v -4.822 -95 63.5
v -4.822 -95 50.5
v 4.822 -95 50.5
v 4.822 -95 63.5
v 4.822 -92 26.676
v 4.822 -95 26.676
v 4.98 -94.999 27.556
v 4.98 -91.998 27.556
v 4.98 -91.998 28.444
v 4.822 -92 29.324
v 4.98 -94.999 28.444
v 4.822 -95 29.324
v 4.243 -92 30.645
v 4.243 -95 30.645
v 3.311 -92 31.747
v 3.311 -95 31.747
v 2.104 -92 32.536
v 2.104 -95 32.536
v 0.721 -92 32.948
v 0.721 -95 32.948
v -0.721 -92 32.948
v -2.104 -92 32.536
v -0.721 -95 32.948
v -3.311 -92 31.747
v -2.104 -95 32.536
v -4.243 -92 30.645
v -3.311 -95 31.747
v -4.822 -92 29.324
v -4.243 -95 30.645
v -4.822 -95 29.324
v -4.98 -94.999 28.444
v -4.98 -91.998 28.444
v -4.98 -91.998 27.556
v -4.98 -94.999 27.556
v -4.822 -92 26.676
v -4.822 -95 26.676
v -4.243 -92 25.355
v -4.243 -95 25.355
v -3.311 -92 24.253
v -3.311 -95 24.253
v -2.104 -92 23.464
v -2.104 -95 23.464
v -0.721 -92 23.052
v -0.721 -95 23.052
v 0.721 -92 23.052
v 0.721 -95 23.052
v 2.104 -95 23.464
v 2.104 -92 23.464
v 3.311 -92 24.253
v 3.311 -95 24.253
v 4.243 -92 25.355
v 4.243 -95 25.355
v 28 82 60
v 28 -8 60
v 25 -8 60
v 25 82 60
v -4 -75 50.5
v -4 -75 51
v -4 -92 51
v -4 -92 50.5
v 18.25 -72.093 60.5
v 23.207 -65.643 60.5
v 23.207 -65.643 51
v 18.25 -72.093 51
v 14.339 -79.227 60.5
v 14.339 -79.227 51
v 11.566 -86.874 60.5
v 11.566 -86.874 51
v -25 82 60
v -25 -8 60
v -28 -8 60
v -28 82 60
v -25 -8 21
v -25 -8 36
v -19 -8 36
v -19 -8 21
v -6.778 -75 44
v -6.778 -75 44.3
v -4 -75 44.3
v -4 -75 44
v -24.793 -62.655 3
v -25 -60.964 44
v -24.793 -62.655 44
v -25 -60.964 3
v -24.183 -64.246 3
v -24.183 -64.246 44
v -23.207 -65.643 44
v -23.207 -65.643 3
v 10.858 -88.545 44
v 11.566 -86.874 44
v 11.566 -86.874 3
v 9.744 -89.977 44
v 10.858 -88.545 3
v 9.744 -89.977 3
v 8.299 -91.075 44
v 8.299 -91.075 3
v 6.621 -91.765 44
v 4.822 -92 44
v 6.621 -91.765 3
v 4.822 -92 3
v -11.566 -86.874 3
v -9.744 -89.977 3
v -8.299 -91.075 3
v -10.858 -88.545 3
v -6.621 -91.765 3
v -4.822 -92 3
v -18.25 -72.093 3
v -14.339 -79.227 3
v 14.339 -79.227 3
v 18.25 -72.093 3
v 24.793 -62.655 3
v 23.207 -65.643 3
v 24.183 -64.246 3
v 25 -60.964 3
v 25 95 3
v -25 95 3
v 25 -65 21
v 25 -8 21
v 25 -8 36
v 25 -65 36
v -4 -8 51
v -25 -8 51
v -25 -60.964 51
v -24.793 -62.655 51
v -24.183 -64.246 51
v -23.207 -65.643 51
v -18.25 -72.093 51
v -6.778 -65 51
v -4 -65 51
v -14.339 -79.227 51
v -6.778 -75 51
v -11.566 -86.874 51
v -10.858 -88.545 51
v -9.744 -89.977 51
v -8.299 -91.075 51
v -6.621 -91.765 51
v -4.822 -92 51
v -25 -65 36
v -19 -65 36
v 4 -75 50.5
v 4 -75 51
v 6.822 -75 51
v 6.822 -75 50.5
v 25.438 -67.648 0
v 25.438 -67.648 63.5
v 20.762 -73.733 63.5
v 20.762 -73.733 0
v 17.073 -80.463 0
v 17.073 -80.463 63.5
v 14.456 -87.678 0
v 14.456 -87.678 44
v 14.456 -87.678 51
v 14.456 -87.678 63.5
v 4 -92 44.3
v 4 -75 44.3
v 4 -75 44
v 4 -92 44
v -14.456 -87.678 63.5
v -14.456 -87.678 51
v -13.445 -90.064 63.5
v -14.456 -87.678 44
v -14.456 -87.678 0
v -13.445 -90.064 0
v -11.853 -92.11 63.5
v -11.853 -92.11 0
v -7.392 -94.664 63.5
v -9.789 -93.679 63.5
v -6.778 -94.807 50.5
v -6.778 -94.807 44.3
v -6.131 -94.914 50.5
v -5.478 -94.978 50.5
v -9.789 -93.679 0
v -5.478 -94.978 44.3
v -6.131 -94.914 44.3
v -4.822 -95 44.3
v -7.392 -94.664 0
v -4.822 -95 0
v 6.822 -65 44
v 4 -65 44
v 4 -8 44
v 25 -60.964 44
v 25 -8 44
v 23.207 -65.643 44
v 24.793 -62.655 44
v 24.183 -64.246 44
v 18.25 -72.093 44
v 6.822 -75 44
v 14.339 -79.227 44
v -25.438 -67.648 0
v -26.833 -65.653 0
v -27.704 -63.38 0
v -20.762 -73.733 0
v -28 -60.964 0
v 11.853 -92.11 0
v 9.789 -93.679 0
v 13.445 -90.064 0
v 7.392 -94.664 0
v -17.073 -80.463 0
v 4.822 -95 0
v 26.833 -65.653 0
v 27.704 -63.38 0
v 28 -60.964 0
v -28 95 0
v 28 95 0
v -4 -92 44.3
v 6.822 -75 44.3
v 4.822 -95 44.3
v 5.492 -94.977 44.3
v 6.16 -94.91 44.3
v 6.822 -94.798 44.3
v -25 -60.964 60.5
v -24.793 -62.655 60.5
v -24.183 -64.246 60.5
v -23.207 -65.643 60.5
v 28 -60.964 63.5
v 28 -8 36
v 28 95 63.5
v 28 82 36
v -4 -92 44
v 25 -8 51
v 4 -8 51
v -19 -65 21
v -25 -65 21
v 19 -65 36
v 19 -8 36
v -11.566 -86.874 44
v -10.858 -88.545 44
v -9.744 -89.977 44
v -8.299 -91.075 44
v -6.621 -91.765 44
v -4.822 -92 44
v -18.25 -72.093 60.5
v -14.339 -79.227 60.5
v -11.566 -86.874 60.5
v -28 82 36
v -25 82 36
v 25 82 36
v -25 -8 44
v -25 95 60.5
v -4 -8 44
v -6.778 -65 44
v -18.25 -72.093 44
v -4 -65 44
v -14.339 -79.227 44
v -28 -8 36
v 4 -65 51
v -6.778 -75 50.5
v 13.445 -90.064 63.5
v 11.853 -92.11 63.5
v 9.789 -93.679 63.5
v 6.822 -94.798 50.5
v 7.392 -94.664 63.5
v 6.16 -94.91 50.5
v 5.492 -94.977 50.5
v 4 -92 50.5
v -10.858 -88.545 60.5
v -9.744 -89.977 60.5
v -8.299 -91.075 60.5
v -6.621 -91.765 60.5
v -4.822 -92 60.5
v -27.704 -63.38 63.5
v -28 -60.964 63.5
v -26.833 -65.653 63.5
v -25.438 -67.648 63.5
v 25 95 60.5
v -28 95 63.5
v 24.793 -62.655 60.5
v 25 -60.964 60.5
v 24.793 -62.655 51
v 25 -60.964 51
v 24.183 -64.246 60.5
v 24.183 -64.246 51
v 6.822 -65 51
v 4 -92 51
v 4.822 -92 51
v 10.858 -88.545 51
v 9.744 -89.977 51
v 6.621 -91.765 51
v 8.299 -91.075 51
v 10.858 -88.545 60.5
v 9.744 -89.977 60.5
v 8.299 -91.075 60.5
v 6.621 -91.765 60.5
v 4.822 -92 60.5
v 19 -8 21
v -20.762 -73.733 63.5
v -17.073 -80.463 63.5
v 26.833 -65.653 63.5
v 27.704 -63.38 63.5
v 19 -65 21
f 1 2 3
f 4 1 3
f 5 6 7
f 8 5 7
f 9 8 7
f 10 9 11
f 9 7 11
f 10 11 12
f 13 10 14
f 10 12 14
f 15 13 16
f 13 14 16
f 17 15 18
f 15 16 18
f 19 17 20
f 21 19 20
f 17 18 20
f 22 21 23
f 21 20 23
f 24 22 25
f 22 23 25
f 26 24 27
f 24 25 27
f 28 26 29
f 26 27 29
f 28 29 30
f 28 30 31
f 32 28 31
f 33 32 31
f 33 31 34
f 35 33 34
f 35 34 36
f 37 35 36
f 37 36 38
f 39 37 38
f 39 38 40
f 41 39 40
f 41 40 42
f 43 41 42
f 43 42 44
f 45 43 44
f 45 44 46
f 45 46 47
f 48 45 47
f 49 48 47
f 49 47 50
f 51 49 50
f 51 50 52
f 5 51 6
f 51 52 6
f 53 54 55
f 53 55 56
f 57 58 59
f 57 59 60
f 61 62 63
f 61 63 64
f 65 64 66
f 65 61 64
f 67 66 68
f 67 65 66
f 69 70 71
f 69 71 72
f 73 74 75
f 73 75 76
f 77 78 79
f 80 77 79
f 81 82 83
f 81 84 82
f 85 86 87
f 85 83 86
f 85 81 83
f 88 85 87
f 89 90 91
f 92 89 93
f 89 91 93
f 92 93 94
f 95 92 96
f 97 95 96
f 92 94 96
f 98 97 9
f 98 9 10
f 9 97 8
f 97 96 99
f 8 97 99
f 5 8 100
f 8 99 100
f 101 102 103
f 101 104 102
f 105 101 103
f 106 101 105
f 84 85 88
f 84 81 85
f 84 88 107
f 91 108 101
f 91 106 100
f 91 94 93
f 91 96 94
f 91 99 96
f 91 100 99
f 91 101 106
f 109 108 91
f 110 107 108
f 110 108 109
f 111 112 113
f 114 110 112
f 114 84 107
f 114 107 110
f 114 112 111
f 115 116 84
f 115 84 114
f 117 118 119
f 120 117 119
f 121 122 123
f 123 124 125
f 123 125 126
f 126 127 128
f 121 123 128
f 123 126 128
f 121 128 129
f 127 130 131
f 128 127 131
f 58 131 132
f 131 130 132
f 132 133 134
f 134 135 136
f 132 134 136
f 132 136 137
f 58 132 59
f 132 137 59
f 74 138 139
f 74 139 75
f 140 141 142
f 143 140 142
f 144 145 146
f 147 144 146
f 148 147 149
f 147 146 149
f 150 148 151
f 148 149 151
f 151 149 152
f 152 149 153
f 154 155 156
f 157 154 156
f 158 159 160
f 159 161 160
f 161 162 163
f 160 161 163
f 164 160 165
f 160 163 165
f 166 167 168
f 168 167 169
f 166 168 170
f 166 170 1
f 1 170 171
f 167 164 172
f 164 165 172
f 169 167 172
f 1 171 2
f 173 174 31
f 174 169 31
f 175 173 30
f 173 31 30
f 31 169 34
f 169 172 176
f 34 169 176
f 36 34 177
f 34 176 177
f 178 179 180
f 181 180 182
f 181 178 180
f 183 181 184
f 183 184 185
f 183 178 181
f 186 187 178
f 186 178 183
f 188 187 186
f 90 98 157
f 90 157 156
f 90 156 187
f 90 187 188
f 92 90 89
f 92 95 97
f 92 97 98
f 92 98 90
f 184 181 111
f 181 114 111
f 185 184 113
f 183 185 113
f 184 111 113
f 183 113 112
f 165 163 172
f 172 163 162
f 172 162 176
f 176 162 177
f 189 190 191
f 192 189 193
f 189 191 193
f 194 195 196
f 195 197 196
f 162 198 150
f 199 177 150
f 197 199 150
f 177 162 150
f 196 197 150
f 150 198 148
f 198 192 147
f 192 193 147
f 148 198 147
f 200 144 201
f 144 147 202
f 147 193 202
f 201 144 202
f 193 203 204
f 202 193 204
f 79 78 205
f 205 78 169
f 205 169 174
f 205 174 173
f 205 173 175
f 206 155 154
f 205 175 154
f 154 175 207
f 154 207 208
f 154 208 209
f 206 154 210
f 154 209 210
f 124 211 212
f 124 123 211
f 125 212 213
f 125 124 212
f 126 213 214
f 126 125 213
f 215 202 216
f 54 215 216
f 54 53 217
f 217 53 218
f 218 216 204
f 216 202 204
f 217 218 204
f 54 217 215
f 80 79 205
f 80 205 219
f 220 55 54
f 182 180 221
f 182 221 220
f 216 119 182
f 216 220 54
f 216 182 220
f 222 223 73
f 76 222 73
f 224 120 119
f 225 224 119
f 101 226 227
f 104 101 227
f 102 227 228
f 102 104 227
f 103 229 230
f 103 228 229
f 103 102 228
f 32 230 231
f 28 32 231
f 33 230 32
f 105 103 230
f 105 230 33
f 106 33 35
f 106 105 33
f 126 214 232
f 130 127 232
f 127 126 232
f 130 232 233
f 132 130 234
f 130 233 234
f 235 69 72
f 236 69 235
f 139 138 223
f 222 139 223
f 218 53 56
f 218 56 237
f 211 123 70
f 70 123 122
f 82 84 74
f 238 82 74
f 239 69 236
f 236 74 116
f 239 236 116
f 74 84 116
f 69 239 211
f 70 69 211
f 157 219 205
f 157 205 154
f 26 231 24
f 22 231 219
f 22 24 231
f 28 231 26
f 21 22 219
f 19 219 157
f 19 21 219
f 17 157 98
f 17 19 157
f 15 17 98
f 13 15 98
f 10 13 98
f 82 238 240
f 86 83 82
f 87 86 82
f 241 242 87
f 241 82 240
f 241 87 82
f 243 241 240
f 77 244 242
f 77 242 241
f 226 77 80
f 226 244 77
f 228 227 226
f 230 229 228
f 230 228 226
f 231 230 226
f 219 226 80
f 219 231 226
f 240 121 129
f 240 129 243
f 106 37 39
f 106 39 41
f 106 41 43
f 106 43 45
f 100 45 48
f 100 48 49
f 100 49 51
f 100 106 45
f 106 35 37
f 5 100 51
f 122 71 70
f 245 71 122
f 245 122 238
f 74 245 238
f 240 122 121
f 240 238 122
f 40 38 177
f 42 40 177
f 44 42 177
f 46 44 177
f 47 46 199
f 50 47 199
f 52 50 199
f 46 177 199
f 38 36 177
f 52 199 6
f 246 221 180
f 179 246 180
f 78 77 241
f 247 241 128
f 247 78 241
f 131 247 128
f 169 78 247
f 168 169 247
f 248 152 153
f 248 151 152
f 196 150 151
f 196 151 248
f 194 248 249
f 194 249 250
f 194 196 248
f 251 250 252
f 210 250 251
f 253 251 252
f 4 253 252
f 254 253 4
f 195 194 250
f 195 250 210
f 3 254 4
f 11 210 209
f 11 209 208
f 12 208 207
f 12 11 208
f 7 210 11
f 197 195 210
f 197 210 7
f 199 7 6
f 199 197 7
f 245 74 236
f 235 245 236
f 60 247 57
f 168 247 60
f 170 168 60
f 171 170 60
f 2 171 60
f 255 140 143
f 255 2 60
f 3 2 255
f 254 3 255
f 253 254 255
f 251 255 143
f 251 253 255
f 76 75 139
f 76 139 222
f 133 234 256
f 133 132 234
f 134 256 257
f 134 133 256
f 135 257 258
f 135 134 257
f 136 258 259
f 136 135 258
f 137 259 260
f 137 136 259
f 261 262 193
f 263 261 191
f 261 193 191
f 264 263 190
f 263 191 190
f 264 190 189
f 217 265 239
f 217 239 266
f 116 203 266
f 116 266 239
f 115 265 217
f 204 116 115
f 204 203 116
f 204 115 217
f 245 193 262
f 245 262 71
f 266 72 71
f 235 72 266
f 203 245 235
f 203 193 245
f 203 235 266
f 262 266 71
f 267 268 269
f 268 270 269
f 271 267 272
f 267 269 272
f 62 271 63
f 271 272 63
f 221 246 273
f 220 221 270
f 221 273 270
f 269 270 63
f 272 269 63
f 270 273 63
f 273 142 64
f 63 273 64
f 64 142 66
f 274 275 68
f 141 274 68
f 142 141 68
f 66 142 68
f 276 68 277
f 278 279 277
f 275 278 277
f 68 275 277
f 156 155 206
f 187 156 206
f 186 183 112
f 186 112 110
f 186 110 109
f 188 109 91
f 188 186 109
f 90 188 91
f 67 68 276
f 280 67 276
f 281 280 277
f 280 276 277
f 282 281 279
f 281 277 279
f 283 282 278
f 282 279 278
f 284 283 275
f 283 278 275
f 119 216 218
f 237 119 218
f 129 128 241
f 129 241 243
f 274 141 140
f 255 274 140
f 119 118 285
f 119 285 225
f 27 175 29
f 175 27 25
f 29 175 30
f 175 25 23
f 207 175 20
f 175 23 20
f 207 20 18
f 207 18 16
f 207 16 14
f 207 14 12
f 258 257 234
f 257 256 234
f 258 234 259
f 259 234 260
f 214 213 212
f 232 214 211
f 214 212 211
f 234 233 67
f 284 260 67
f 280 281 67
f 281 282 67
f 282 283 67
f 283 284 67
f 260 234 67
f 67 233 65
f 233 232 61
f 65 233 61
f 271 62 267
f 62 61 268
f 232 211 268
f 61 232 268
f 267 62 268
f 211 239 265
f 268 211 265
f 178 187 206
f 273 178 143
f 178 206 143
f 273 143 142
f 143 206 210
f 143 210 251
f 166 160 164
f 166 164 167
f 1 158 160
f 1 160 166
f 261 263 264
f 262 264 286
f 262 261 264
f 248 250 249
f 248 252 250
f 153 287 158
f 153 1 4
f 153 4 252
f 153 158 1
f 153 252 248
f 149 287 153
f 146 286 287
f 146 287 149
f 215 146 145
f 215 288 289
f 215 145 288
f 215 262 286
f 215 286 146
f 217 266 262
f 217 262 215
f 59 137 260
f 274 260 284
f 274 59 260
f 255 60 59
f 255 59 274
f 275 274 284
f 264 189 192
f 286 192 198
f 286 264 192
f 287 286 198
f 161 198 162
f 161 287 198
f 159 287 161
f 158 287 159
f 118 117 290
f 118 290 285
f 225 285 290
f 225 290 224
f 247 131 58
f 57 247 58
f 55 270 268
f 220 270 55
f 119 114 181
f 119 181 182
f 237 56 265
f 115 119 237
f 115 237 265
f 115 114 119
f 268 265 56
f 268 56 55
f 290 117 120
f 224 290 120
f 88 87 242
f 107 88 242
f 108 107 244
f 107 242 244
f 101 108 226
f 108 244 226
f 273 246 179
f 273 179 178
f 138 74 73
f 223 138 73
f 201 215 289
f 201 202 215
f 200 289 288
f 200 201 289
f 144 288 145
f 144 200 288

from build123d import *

# Parameters (mm, degrees)
CROQUIS2_W              = 56
CROQUIS2_H              = 190
SALIENTE_EXTRUIR1_DEPTH = 63.5
CORTAR_EXTRUIR6_DEPTH   = 65
REDONDEO1_R             = 10
VACIADO2_T              = -3
CROQUIS10_W             = 24
CROQUIS10_H             = 90
CORTAR_EXTRUIR1_DEPTH   = 129
CROQUIS12_W             = 50
CROQUIS12_H             = 7
SALIENTE_EXTRUIR2_DEPTH = 84
CROQUIS13_W             = 8
CROQUIS13_H             = 7.031646252
CORTAR_EXTRUIR2_DEPTH   = 84
CROQUIS14_R             = 5
CORTAR_EXTRUIR3_DEPTH   = 84
CORTAR_EXTRUIR5_DEPTH   = 10
CROQUIS18_W             = 15
CROQUIS18_H             = 57
SALIENTE_EXTRUIR4_DEPTH = 6
CROQUIS19_W             = 15
CROQUIS19_H             = 57
SALIENTE_EXTRUIR5_DEPTH = 6
CROQUIS22_R             = 5
CROQUIS22_W             = 13.6
CROQUIS22_H             = 6.2
CORTAR_EXTRUIR7_DEPTH   = 20
CROQUIS23_W             = 13.6
CROQUIS23_H             = 7
CORTAR_EXTRUIR8_DEPTH   = 10


with BuildPart() as part:
    # Croquis2 → Saliente-Extruir1 (new body)
    with BuildSketch(Plane.XY):
        Rectangle(CROQUIS2_W, CROQUIS2_H)
    extrude(amount=SALIENTE_EXTRUIR1_DEPTH)

    # Croquis20 → Cortar-Extruir6 (cut)
    with BuildSketch(Plane.XY.offset(63.5)):
        with BuildLine():
            Line((-13, -95), (-28, -95))
            Line((-28, -95), (-28, -65))
            ThreePointArc((-28, -65), (-17.909389316, -78.704694658), (-13, -95))
        make_face()
        with BuildLine():
            Line((13, -95), (28, -95))
            Line((28, -95), (28, -65))
            ThreePointArc((28, -65), (17.909389316, -78.704694658), (13, -95))
        make_face()
    extrude(amount=-CORTAR_EXTRUIR6_DEPTH, mode=Mode.SUBTRACT)

    # Redondeo1
    redondeo1_edges = [part.edges().sort_by_distance(p)[0] for p in [
        (13, -95, 31.75),
        (28, -65, 31.75),
        (-28, -65, 31.75),
        (-13, -95, 31.75),
    ]]
    fillet(redondeo1_edges, radius=REDONDEO1_R)

    # Vaciado2
    vaciado2_openings = [part.faces().sort_by_distance(p)[0] for p in [
        (0, 95, 31.75),
    ]]
    offset(amount=VACIADO2_T, openings=vaciado2_openings, kind=Kind.INTERSECTION)

    # Croquis10 → Cortar-Extruir1 (cut)
    with BuildSketch(Plane(origin=(28, 0, 0), x_dir=(0, 0, -1), z_dir=(1, 0, 0))):
        with Locations((-48, 37)):
            Rectangle(CROQUIS10_W, CROQUIS10_H)
    extrude(amount=-CORTAR_EXTRUIR1_DEPTH, mode=Mode.SUBTRACT)

    # Croquis12 → Saliente-Extruir2 (add)
    with BuildSketch(Plane(origin=(0, -92, 0), x_dir=(1, 0, 0), z_dir=(0, 1, 0))):
        with Locations((0, -47.5)):
            Rectangle(CROQUIS12_W, CROQUIS12_H)
    extrude(amount=SALIENTE_EXTRUIR2_DEPTH)

    # Croquis13 → Cortar-Extruir2 (cut)
    with BuildSketch(Plane(origin=(0, -8, 0), x_dir=(1, 0, 0), z_dir=(0, 1, 0))):
        with Locations((0, -47.515823126)):
            Rectangle(CROQUIS13_W, CROQUIS13_H)
    extrude(amount=-CORTAR_EXTRUIR2_DEPTH, mode=Mode.SUBTRACT)

    # Croquis14 → Cortar-Extruir3 (cut)
    with BuildSketch(Plane.XZ.offset(95)):
        with Locations(Location((0, 28, 0), (0, 0, 344.646267442))):
            Circle(CROQUIS14_R)
    extrude(amount=-CORTAR_EXTRUIR3_DEPTH, mode=Mode.SUBTRACT)

    # Croquis17 → Cortar-Extruir5 (cut)
    with BuildSketch(Plane(origin=(0, 0, 44), x_dir=(-1, 0, 0), z_dir=(0, 0, -1))):
        with BuildLine():
            Line((11.962976086, -92), (25, -92))
            Line((25, -92), (25, -68.142331746))
            ThreePointArc((25, -68.142331746), (18.630358126, -77.31741421), (14.456414526, -87.677562405))
            ThreePointArc((14.456414526, -87.677562405), (13.483642535, -89.996810217), (11.962976086, -92))
        make_face()
        with BuildLine():
            Line((-25, -68.142331746), (-25, -92))
            Line((-25, -92), (-11.962976086, -92))
            ThreePointArc((-11.962976086, -92), (-13.483642535, -89.996810217), (-14.456414526, -87.677562405))
            ThreePointArc((-14.456414526, -87.677562405), (-18.630358126, -77.31741421), (-25, -68.142331746))
        make_face()
    extrude(amount=-CORTAR_EXTRUIR5_DEPTH, mode=Mode.SUBTRACT)

    # Croquis22 → Cortar-Extruir7 (cut)
    with BuildSketch(Plane.XZ.offset(95)):
        with Locations(Location((0, 28, 0), (0, 0, 344.646267442))):
            Circle(CROQUIS22_R)
        with Locations((0.021547658, 47.4)):
            Rectangle(CROQUIS22_W, CROQUIS22_H)
    extrude(amount=-CORTAR_EXTRUIR7_DEPTH, mode=Mode.SUBTRACT)

    # Croquis23 → Cortar-Extruir8 (cut)
    with BuildSketch(Plane.XZ.offset(75)):
        with Locations((0.021547658, 47.5)):
            Rectangle(CROQUIS23_W, CROQUIS23_H)
    extrude(amount=-CORTAR_EXTRUIR8_DEPTH, mode=Mode.SUBTRACT)


with BuildPart() as body_2:
    # Croquis18 → Saliente-Extruir4 (new body)
    with BuildSketch(Plane(origin=(-25, 0, 0), x_dir=(0, 0, -1), z_dir=(1, 0, 0))):
        with Locations((-28.5, -36.5)):
            Rectangle(CROQUIS18_W, CROQUIS18_H)
    extrude(amount=SALIENTE_EXTRUIR4_DEPTH)


with BuildPart() as body_3:
    # Croquis19 → Saliente-Extruir5 (new body)
    with BuildSketch(Plane.ZY.offset(-25)):
        with Locations((28.5, -36.5)):
            Rectangle(CROQUIS19_W, CROQUIS19_H)
    extrude(amount=SALIENTE_EXTRUIR5_DEPTH)


solid = Compound([part.part, body_2.part, body_3.part])
